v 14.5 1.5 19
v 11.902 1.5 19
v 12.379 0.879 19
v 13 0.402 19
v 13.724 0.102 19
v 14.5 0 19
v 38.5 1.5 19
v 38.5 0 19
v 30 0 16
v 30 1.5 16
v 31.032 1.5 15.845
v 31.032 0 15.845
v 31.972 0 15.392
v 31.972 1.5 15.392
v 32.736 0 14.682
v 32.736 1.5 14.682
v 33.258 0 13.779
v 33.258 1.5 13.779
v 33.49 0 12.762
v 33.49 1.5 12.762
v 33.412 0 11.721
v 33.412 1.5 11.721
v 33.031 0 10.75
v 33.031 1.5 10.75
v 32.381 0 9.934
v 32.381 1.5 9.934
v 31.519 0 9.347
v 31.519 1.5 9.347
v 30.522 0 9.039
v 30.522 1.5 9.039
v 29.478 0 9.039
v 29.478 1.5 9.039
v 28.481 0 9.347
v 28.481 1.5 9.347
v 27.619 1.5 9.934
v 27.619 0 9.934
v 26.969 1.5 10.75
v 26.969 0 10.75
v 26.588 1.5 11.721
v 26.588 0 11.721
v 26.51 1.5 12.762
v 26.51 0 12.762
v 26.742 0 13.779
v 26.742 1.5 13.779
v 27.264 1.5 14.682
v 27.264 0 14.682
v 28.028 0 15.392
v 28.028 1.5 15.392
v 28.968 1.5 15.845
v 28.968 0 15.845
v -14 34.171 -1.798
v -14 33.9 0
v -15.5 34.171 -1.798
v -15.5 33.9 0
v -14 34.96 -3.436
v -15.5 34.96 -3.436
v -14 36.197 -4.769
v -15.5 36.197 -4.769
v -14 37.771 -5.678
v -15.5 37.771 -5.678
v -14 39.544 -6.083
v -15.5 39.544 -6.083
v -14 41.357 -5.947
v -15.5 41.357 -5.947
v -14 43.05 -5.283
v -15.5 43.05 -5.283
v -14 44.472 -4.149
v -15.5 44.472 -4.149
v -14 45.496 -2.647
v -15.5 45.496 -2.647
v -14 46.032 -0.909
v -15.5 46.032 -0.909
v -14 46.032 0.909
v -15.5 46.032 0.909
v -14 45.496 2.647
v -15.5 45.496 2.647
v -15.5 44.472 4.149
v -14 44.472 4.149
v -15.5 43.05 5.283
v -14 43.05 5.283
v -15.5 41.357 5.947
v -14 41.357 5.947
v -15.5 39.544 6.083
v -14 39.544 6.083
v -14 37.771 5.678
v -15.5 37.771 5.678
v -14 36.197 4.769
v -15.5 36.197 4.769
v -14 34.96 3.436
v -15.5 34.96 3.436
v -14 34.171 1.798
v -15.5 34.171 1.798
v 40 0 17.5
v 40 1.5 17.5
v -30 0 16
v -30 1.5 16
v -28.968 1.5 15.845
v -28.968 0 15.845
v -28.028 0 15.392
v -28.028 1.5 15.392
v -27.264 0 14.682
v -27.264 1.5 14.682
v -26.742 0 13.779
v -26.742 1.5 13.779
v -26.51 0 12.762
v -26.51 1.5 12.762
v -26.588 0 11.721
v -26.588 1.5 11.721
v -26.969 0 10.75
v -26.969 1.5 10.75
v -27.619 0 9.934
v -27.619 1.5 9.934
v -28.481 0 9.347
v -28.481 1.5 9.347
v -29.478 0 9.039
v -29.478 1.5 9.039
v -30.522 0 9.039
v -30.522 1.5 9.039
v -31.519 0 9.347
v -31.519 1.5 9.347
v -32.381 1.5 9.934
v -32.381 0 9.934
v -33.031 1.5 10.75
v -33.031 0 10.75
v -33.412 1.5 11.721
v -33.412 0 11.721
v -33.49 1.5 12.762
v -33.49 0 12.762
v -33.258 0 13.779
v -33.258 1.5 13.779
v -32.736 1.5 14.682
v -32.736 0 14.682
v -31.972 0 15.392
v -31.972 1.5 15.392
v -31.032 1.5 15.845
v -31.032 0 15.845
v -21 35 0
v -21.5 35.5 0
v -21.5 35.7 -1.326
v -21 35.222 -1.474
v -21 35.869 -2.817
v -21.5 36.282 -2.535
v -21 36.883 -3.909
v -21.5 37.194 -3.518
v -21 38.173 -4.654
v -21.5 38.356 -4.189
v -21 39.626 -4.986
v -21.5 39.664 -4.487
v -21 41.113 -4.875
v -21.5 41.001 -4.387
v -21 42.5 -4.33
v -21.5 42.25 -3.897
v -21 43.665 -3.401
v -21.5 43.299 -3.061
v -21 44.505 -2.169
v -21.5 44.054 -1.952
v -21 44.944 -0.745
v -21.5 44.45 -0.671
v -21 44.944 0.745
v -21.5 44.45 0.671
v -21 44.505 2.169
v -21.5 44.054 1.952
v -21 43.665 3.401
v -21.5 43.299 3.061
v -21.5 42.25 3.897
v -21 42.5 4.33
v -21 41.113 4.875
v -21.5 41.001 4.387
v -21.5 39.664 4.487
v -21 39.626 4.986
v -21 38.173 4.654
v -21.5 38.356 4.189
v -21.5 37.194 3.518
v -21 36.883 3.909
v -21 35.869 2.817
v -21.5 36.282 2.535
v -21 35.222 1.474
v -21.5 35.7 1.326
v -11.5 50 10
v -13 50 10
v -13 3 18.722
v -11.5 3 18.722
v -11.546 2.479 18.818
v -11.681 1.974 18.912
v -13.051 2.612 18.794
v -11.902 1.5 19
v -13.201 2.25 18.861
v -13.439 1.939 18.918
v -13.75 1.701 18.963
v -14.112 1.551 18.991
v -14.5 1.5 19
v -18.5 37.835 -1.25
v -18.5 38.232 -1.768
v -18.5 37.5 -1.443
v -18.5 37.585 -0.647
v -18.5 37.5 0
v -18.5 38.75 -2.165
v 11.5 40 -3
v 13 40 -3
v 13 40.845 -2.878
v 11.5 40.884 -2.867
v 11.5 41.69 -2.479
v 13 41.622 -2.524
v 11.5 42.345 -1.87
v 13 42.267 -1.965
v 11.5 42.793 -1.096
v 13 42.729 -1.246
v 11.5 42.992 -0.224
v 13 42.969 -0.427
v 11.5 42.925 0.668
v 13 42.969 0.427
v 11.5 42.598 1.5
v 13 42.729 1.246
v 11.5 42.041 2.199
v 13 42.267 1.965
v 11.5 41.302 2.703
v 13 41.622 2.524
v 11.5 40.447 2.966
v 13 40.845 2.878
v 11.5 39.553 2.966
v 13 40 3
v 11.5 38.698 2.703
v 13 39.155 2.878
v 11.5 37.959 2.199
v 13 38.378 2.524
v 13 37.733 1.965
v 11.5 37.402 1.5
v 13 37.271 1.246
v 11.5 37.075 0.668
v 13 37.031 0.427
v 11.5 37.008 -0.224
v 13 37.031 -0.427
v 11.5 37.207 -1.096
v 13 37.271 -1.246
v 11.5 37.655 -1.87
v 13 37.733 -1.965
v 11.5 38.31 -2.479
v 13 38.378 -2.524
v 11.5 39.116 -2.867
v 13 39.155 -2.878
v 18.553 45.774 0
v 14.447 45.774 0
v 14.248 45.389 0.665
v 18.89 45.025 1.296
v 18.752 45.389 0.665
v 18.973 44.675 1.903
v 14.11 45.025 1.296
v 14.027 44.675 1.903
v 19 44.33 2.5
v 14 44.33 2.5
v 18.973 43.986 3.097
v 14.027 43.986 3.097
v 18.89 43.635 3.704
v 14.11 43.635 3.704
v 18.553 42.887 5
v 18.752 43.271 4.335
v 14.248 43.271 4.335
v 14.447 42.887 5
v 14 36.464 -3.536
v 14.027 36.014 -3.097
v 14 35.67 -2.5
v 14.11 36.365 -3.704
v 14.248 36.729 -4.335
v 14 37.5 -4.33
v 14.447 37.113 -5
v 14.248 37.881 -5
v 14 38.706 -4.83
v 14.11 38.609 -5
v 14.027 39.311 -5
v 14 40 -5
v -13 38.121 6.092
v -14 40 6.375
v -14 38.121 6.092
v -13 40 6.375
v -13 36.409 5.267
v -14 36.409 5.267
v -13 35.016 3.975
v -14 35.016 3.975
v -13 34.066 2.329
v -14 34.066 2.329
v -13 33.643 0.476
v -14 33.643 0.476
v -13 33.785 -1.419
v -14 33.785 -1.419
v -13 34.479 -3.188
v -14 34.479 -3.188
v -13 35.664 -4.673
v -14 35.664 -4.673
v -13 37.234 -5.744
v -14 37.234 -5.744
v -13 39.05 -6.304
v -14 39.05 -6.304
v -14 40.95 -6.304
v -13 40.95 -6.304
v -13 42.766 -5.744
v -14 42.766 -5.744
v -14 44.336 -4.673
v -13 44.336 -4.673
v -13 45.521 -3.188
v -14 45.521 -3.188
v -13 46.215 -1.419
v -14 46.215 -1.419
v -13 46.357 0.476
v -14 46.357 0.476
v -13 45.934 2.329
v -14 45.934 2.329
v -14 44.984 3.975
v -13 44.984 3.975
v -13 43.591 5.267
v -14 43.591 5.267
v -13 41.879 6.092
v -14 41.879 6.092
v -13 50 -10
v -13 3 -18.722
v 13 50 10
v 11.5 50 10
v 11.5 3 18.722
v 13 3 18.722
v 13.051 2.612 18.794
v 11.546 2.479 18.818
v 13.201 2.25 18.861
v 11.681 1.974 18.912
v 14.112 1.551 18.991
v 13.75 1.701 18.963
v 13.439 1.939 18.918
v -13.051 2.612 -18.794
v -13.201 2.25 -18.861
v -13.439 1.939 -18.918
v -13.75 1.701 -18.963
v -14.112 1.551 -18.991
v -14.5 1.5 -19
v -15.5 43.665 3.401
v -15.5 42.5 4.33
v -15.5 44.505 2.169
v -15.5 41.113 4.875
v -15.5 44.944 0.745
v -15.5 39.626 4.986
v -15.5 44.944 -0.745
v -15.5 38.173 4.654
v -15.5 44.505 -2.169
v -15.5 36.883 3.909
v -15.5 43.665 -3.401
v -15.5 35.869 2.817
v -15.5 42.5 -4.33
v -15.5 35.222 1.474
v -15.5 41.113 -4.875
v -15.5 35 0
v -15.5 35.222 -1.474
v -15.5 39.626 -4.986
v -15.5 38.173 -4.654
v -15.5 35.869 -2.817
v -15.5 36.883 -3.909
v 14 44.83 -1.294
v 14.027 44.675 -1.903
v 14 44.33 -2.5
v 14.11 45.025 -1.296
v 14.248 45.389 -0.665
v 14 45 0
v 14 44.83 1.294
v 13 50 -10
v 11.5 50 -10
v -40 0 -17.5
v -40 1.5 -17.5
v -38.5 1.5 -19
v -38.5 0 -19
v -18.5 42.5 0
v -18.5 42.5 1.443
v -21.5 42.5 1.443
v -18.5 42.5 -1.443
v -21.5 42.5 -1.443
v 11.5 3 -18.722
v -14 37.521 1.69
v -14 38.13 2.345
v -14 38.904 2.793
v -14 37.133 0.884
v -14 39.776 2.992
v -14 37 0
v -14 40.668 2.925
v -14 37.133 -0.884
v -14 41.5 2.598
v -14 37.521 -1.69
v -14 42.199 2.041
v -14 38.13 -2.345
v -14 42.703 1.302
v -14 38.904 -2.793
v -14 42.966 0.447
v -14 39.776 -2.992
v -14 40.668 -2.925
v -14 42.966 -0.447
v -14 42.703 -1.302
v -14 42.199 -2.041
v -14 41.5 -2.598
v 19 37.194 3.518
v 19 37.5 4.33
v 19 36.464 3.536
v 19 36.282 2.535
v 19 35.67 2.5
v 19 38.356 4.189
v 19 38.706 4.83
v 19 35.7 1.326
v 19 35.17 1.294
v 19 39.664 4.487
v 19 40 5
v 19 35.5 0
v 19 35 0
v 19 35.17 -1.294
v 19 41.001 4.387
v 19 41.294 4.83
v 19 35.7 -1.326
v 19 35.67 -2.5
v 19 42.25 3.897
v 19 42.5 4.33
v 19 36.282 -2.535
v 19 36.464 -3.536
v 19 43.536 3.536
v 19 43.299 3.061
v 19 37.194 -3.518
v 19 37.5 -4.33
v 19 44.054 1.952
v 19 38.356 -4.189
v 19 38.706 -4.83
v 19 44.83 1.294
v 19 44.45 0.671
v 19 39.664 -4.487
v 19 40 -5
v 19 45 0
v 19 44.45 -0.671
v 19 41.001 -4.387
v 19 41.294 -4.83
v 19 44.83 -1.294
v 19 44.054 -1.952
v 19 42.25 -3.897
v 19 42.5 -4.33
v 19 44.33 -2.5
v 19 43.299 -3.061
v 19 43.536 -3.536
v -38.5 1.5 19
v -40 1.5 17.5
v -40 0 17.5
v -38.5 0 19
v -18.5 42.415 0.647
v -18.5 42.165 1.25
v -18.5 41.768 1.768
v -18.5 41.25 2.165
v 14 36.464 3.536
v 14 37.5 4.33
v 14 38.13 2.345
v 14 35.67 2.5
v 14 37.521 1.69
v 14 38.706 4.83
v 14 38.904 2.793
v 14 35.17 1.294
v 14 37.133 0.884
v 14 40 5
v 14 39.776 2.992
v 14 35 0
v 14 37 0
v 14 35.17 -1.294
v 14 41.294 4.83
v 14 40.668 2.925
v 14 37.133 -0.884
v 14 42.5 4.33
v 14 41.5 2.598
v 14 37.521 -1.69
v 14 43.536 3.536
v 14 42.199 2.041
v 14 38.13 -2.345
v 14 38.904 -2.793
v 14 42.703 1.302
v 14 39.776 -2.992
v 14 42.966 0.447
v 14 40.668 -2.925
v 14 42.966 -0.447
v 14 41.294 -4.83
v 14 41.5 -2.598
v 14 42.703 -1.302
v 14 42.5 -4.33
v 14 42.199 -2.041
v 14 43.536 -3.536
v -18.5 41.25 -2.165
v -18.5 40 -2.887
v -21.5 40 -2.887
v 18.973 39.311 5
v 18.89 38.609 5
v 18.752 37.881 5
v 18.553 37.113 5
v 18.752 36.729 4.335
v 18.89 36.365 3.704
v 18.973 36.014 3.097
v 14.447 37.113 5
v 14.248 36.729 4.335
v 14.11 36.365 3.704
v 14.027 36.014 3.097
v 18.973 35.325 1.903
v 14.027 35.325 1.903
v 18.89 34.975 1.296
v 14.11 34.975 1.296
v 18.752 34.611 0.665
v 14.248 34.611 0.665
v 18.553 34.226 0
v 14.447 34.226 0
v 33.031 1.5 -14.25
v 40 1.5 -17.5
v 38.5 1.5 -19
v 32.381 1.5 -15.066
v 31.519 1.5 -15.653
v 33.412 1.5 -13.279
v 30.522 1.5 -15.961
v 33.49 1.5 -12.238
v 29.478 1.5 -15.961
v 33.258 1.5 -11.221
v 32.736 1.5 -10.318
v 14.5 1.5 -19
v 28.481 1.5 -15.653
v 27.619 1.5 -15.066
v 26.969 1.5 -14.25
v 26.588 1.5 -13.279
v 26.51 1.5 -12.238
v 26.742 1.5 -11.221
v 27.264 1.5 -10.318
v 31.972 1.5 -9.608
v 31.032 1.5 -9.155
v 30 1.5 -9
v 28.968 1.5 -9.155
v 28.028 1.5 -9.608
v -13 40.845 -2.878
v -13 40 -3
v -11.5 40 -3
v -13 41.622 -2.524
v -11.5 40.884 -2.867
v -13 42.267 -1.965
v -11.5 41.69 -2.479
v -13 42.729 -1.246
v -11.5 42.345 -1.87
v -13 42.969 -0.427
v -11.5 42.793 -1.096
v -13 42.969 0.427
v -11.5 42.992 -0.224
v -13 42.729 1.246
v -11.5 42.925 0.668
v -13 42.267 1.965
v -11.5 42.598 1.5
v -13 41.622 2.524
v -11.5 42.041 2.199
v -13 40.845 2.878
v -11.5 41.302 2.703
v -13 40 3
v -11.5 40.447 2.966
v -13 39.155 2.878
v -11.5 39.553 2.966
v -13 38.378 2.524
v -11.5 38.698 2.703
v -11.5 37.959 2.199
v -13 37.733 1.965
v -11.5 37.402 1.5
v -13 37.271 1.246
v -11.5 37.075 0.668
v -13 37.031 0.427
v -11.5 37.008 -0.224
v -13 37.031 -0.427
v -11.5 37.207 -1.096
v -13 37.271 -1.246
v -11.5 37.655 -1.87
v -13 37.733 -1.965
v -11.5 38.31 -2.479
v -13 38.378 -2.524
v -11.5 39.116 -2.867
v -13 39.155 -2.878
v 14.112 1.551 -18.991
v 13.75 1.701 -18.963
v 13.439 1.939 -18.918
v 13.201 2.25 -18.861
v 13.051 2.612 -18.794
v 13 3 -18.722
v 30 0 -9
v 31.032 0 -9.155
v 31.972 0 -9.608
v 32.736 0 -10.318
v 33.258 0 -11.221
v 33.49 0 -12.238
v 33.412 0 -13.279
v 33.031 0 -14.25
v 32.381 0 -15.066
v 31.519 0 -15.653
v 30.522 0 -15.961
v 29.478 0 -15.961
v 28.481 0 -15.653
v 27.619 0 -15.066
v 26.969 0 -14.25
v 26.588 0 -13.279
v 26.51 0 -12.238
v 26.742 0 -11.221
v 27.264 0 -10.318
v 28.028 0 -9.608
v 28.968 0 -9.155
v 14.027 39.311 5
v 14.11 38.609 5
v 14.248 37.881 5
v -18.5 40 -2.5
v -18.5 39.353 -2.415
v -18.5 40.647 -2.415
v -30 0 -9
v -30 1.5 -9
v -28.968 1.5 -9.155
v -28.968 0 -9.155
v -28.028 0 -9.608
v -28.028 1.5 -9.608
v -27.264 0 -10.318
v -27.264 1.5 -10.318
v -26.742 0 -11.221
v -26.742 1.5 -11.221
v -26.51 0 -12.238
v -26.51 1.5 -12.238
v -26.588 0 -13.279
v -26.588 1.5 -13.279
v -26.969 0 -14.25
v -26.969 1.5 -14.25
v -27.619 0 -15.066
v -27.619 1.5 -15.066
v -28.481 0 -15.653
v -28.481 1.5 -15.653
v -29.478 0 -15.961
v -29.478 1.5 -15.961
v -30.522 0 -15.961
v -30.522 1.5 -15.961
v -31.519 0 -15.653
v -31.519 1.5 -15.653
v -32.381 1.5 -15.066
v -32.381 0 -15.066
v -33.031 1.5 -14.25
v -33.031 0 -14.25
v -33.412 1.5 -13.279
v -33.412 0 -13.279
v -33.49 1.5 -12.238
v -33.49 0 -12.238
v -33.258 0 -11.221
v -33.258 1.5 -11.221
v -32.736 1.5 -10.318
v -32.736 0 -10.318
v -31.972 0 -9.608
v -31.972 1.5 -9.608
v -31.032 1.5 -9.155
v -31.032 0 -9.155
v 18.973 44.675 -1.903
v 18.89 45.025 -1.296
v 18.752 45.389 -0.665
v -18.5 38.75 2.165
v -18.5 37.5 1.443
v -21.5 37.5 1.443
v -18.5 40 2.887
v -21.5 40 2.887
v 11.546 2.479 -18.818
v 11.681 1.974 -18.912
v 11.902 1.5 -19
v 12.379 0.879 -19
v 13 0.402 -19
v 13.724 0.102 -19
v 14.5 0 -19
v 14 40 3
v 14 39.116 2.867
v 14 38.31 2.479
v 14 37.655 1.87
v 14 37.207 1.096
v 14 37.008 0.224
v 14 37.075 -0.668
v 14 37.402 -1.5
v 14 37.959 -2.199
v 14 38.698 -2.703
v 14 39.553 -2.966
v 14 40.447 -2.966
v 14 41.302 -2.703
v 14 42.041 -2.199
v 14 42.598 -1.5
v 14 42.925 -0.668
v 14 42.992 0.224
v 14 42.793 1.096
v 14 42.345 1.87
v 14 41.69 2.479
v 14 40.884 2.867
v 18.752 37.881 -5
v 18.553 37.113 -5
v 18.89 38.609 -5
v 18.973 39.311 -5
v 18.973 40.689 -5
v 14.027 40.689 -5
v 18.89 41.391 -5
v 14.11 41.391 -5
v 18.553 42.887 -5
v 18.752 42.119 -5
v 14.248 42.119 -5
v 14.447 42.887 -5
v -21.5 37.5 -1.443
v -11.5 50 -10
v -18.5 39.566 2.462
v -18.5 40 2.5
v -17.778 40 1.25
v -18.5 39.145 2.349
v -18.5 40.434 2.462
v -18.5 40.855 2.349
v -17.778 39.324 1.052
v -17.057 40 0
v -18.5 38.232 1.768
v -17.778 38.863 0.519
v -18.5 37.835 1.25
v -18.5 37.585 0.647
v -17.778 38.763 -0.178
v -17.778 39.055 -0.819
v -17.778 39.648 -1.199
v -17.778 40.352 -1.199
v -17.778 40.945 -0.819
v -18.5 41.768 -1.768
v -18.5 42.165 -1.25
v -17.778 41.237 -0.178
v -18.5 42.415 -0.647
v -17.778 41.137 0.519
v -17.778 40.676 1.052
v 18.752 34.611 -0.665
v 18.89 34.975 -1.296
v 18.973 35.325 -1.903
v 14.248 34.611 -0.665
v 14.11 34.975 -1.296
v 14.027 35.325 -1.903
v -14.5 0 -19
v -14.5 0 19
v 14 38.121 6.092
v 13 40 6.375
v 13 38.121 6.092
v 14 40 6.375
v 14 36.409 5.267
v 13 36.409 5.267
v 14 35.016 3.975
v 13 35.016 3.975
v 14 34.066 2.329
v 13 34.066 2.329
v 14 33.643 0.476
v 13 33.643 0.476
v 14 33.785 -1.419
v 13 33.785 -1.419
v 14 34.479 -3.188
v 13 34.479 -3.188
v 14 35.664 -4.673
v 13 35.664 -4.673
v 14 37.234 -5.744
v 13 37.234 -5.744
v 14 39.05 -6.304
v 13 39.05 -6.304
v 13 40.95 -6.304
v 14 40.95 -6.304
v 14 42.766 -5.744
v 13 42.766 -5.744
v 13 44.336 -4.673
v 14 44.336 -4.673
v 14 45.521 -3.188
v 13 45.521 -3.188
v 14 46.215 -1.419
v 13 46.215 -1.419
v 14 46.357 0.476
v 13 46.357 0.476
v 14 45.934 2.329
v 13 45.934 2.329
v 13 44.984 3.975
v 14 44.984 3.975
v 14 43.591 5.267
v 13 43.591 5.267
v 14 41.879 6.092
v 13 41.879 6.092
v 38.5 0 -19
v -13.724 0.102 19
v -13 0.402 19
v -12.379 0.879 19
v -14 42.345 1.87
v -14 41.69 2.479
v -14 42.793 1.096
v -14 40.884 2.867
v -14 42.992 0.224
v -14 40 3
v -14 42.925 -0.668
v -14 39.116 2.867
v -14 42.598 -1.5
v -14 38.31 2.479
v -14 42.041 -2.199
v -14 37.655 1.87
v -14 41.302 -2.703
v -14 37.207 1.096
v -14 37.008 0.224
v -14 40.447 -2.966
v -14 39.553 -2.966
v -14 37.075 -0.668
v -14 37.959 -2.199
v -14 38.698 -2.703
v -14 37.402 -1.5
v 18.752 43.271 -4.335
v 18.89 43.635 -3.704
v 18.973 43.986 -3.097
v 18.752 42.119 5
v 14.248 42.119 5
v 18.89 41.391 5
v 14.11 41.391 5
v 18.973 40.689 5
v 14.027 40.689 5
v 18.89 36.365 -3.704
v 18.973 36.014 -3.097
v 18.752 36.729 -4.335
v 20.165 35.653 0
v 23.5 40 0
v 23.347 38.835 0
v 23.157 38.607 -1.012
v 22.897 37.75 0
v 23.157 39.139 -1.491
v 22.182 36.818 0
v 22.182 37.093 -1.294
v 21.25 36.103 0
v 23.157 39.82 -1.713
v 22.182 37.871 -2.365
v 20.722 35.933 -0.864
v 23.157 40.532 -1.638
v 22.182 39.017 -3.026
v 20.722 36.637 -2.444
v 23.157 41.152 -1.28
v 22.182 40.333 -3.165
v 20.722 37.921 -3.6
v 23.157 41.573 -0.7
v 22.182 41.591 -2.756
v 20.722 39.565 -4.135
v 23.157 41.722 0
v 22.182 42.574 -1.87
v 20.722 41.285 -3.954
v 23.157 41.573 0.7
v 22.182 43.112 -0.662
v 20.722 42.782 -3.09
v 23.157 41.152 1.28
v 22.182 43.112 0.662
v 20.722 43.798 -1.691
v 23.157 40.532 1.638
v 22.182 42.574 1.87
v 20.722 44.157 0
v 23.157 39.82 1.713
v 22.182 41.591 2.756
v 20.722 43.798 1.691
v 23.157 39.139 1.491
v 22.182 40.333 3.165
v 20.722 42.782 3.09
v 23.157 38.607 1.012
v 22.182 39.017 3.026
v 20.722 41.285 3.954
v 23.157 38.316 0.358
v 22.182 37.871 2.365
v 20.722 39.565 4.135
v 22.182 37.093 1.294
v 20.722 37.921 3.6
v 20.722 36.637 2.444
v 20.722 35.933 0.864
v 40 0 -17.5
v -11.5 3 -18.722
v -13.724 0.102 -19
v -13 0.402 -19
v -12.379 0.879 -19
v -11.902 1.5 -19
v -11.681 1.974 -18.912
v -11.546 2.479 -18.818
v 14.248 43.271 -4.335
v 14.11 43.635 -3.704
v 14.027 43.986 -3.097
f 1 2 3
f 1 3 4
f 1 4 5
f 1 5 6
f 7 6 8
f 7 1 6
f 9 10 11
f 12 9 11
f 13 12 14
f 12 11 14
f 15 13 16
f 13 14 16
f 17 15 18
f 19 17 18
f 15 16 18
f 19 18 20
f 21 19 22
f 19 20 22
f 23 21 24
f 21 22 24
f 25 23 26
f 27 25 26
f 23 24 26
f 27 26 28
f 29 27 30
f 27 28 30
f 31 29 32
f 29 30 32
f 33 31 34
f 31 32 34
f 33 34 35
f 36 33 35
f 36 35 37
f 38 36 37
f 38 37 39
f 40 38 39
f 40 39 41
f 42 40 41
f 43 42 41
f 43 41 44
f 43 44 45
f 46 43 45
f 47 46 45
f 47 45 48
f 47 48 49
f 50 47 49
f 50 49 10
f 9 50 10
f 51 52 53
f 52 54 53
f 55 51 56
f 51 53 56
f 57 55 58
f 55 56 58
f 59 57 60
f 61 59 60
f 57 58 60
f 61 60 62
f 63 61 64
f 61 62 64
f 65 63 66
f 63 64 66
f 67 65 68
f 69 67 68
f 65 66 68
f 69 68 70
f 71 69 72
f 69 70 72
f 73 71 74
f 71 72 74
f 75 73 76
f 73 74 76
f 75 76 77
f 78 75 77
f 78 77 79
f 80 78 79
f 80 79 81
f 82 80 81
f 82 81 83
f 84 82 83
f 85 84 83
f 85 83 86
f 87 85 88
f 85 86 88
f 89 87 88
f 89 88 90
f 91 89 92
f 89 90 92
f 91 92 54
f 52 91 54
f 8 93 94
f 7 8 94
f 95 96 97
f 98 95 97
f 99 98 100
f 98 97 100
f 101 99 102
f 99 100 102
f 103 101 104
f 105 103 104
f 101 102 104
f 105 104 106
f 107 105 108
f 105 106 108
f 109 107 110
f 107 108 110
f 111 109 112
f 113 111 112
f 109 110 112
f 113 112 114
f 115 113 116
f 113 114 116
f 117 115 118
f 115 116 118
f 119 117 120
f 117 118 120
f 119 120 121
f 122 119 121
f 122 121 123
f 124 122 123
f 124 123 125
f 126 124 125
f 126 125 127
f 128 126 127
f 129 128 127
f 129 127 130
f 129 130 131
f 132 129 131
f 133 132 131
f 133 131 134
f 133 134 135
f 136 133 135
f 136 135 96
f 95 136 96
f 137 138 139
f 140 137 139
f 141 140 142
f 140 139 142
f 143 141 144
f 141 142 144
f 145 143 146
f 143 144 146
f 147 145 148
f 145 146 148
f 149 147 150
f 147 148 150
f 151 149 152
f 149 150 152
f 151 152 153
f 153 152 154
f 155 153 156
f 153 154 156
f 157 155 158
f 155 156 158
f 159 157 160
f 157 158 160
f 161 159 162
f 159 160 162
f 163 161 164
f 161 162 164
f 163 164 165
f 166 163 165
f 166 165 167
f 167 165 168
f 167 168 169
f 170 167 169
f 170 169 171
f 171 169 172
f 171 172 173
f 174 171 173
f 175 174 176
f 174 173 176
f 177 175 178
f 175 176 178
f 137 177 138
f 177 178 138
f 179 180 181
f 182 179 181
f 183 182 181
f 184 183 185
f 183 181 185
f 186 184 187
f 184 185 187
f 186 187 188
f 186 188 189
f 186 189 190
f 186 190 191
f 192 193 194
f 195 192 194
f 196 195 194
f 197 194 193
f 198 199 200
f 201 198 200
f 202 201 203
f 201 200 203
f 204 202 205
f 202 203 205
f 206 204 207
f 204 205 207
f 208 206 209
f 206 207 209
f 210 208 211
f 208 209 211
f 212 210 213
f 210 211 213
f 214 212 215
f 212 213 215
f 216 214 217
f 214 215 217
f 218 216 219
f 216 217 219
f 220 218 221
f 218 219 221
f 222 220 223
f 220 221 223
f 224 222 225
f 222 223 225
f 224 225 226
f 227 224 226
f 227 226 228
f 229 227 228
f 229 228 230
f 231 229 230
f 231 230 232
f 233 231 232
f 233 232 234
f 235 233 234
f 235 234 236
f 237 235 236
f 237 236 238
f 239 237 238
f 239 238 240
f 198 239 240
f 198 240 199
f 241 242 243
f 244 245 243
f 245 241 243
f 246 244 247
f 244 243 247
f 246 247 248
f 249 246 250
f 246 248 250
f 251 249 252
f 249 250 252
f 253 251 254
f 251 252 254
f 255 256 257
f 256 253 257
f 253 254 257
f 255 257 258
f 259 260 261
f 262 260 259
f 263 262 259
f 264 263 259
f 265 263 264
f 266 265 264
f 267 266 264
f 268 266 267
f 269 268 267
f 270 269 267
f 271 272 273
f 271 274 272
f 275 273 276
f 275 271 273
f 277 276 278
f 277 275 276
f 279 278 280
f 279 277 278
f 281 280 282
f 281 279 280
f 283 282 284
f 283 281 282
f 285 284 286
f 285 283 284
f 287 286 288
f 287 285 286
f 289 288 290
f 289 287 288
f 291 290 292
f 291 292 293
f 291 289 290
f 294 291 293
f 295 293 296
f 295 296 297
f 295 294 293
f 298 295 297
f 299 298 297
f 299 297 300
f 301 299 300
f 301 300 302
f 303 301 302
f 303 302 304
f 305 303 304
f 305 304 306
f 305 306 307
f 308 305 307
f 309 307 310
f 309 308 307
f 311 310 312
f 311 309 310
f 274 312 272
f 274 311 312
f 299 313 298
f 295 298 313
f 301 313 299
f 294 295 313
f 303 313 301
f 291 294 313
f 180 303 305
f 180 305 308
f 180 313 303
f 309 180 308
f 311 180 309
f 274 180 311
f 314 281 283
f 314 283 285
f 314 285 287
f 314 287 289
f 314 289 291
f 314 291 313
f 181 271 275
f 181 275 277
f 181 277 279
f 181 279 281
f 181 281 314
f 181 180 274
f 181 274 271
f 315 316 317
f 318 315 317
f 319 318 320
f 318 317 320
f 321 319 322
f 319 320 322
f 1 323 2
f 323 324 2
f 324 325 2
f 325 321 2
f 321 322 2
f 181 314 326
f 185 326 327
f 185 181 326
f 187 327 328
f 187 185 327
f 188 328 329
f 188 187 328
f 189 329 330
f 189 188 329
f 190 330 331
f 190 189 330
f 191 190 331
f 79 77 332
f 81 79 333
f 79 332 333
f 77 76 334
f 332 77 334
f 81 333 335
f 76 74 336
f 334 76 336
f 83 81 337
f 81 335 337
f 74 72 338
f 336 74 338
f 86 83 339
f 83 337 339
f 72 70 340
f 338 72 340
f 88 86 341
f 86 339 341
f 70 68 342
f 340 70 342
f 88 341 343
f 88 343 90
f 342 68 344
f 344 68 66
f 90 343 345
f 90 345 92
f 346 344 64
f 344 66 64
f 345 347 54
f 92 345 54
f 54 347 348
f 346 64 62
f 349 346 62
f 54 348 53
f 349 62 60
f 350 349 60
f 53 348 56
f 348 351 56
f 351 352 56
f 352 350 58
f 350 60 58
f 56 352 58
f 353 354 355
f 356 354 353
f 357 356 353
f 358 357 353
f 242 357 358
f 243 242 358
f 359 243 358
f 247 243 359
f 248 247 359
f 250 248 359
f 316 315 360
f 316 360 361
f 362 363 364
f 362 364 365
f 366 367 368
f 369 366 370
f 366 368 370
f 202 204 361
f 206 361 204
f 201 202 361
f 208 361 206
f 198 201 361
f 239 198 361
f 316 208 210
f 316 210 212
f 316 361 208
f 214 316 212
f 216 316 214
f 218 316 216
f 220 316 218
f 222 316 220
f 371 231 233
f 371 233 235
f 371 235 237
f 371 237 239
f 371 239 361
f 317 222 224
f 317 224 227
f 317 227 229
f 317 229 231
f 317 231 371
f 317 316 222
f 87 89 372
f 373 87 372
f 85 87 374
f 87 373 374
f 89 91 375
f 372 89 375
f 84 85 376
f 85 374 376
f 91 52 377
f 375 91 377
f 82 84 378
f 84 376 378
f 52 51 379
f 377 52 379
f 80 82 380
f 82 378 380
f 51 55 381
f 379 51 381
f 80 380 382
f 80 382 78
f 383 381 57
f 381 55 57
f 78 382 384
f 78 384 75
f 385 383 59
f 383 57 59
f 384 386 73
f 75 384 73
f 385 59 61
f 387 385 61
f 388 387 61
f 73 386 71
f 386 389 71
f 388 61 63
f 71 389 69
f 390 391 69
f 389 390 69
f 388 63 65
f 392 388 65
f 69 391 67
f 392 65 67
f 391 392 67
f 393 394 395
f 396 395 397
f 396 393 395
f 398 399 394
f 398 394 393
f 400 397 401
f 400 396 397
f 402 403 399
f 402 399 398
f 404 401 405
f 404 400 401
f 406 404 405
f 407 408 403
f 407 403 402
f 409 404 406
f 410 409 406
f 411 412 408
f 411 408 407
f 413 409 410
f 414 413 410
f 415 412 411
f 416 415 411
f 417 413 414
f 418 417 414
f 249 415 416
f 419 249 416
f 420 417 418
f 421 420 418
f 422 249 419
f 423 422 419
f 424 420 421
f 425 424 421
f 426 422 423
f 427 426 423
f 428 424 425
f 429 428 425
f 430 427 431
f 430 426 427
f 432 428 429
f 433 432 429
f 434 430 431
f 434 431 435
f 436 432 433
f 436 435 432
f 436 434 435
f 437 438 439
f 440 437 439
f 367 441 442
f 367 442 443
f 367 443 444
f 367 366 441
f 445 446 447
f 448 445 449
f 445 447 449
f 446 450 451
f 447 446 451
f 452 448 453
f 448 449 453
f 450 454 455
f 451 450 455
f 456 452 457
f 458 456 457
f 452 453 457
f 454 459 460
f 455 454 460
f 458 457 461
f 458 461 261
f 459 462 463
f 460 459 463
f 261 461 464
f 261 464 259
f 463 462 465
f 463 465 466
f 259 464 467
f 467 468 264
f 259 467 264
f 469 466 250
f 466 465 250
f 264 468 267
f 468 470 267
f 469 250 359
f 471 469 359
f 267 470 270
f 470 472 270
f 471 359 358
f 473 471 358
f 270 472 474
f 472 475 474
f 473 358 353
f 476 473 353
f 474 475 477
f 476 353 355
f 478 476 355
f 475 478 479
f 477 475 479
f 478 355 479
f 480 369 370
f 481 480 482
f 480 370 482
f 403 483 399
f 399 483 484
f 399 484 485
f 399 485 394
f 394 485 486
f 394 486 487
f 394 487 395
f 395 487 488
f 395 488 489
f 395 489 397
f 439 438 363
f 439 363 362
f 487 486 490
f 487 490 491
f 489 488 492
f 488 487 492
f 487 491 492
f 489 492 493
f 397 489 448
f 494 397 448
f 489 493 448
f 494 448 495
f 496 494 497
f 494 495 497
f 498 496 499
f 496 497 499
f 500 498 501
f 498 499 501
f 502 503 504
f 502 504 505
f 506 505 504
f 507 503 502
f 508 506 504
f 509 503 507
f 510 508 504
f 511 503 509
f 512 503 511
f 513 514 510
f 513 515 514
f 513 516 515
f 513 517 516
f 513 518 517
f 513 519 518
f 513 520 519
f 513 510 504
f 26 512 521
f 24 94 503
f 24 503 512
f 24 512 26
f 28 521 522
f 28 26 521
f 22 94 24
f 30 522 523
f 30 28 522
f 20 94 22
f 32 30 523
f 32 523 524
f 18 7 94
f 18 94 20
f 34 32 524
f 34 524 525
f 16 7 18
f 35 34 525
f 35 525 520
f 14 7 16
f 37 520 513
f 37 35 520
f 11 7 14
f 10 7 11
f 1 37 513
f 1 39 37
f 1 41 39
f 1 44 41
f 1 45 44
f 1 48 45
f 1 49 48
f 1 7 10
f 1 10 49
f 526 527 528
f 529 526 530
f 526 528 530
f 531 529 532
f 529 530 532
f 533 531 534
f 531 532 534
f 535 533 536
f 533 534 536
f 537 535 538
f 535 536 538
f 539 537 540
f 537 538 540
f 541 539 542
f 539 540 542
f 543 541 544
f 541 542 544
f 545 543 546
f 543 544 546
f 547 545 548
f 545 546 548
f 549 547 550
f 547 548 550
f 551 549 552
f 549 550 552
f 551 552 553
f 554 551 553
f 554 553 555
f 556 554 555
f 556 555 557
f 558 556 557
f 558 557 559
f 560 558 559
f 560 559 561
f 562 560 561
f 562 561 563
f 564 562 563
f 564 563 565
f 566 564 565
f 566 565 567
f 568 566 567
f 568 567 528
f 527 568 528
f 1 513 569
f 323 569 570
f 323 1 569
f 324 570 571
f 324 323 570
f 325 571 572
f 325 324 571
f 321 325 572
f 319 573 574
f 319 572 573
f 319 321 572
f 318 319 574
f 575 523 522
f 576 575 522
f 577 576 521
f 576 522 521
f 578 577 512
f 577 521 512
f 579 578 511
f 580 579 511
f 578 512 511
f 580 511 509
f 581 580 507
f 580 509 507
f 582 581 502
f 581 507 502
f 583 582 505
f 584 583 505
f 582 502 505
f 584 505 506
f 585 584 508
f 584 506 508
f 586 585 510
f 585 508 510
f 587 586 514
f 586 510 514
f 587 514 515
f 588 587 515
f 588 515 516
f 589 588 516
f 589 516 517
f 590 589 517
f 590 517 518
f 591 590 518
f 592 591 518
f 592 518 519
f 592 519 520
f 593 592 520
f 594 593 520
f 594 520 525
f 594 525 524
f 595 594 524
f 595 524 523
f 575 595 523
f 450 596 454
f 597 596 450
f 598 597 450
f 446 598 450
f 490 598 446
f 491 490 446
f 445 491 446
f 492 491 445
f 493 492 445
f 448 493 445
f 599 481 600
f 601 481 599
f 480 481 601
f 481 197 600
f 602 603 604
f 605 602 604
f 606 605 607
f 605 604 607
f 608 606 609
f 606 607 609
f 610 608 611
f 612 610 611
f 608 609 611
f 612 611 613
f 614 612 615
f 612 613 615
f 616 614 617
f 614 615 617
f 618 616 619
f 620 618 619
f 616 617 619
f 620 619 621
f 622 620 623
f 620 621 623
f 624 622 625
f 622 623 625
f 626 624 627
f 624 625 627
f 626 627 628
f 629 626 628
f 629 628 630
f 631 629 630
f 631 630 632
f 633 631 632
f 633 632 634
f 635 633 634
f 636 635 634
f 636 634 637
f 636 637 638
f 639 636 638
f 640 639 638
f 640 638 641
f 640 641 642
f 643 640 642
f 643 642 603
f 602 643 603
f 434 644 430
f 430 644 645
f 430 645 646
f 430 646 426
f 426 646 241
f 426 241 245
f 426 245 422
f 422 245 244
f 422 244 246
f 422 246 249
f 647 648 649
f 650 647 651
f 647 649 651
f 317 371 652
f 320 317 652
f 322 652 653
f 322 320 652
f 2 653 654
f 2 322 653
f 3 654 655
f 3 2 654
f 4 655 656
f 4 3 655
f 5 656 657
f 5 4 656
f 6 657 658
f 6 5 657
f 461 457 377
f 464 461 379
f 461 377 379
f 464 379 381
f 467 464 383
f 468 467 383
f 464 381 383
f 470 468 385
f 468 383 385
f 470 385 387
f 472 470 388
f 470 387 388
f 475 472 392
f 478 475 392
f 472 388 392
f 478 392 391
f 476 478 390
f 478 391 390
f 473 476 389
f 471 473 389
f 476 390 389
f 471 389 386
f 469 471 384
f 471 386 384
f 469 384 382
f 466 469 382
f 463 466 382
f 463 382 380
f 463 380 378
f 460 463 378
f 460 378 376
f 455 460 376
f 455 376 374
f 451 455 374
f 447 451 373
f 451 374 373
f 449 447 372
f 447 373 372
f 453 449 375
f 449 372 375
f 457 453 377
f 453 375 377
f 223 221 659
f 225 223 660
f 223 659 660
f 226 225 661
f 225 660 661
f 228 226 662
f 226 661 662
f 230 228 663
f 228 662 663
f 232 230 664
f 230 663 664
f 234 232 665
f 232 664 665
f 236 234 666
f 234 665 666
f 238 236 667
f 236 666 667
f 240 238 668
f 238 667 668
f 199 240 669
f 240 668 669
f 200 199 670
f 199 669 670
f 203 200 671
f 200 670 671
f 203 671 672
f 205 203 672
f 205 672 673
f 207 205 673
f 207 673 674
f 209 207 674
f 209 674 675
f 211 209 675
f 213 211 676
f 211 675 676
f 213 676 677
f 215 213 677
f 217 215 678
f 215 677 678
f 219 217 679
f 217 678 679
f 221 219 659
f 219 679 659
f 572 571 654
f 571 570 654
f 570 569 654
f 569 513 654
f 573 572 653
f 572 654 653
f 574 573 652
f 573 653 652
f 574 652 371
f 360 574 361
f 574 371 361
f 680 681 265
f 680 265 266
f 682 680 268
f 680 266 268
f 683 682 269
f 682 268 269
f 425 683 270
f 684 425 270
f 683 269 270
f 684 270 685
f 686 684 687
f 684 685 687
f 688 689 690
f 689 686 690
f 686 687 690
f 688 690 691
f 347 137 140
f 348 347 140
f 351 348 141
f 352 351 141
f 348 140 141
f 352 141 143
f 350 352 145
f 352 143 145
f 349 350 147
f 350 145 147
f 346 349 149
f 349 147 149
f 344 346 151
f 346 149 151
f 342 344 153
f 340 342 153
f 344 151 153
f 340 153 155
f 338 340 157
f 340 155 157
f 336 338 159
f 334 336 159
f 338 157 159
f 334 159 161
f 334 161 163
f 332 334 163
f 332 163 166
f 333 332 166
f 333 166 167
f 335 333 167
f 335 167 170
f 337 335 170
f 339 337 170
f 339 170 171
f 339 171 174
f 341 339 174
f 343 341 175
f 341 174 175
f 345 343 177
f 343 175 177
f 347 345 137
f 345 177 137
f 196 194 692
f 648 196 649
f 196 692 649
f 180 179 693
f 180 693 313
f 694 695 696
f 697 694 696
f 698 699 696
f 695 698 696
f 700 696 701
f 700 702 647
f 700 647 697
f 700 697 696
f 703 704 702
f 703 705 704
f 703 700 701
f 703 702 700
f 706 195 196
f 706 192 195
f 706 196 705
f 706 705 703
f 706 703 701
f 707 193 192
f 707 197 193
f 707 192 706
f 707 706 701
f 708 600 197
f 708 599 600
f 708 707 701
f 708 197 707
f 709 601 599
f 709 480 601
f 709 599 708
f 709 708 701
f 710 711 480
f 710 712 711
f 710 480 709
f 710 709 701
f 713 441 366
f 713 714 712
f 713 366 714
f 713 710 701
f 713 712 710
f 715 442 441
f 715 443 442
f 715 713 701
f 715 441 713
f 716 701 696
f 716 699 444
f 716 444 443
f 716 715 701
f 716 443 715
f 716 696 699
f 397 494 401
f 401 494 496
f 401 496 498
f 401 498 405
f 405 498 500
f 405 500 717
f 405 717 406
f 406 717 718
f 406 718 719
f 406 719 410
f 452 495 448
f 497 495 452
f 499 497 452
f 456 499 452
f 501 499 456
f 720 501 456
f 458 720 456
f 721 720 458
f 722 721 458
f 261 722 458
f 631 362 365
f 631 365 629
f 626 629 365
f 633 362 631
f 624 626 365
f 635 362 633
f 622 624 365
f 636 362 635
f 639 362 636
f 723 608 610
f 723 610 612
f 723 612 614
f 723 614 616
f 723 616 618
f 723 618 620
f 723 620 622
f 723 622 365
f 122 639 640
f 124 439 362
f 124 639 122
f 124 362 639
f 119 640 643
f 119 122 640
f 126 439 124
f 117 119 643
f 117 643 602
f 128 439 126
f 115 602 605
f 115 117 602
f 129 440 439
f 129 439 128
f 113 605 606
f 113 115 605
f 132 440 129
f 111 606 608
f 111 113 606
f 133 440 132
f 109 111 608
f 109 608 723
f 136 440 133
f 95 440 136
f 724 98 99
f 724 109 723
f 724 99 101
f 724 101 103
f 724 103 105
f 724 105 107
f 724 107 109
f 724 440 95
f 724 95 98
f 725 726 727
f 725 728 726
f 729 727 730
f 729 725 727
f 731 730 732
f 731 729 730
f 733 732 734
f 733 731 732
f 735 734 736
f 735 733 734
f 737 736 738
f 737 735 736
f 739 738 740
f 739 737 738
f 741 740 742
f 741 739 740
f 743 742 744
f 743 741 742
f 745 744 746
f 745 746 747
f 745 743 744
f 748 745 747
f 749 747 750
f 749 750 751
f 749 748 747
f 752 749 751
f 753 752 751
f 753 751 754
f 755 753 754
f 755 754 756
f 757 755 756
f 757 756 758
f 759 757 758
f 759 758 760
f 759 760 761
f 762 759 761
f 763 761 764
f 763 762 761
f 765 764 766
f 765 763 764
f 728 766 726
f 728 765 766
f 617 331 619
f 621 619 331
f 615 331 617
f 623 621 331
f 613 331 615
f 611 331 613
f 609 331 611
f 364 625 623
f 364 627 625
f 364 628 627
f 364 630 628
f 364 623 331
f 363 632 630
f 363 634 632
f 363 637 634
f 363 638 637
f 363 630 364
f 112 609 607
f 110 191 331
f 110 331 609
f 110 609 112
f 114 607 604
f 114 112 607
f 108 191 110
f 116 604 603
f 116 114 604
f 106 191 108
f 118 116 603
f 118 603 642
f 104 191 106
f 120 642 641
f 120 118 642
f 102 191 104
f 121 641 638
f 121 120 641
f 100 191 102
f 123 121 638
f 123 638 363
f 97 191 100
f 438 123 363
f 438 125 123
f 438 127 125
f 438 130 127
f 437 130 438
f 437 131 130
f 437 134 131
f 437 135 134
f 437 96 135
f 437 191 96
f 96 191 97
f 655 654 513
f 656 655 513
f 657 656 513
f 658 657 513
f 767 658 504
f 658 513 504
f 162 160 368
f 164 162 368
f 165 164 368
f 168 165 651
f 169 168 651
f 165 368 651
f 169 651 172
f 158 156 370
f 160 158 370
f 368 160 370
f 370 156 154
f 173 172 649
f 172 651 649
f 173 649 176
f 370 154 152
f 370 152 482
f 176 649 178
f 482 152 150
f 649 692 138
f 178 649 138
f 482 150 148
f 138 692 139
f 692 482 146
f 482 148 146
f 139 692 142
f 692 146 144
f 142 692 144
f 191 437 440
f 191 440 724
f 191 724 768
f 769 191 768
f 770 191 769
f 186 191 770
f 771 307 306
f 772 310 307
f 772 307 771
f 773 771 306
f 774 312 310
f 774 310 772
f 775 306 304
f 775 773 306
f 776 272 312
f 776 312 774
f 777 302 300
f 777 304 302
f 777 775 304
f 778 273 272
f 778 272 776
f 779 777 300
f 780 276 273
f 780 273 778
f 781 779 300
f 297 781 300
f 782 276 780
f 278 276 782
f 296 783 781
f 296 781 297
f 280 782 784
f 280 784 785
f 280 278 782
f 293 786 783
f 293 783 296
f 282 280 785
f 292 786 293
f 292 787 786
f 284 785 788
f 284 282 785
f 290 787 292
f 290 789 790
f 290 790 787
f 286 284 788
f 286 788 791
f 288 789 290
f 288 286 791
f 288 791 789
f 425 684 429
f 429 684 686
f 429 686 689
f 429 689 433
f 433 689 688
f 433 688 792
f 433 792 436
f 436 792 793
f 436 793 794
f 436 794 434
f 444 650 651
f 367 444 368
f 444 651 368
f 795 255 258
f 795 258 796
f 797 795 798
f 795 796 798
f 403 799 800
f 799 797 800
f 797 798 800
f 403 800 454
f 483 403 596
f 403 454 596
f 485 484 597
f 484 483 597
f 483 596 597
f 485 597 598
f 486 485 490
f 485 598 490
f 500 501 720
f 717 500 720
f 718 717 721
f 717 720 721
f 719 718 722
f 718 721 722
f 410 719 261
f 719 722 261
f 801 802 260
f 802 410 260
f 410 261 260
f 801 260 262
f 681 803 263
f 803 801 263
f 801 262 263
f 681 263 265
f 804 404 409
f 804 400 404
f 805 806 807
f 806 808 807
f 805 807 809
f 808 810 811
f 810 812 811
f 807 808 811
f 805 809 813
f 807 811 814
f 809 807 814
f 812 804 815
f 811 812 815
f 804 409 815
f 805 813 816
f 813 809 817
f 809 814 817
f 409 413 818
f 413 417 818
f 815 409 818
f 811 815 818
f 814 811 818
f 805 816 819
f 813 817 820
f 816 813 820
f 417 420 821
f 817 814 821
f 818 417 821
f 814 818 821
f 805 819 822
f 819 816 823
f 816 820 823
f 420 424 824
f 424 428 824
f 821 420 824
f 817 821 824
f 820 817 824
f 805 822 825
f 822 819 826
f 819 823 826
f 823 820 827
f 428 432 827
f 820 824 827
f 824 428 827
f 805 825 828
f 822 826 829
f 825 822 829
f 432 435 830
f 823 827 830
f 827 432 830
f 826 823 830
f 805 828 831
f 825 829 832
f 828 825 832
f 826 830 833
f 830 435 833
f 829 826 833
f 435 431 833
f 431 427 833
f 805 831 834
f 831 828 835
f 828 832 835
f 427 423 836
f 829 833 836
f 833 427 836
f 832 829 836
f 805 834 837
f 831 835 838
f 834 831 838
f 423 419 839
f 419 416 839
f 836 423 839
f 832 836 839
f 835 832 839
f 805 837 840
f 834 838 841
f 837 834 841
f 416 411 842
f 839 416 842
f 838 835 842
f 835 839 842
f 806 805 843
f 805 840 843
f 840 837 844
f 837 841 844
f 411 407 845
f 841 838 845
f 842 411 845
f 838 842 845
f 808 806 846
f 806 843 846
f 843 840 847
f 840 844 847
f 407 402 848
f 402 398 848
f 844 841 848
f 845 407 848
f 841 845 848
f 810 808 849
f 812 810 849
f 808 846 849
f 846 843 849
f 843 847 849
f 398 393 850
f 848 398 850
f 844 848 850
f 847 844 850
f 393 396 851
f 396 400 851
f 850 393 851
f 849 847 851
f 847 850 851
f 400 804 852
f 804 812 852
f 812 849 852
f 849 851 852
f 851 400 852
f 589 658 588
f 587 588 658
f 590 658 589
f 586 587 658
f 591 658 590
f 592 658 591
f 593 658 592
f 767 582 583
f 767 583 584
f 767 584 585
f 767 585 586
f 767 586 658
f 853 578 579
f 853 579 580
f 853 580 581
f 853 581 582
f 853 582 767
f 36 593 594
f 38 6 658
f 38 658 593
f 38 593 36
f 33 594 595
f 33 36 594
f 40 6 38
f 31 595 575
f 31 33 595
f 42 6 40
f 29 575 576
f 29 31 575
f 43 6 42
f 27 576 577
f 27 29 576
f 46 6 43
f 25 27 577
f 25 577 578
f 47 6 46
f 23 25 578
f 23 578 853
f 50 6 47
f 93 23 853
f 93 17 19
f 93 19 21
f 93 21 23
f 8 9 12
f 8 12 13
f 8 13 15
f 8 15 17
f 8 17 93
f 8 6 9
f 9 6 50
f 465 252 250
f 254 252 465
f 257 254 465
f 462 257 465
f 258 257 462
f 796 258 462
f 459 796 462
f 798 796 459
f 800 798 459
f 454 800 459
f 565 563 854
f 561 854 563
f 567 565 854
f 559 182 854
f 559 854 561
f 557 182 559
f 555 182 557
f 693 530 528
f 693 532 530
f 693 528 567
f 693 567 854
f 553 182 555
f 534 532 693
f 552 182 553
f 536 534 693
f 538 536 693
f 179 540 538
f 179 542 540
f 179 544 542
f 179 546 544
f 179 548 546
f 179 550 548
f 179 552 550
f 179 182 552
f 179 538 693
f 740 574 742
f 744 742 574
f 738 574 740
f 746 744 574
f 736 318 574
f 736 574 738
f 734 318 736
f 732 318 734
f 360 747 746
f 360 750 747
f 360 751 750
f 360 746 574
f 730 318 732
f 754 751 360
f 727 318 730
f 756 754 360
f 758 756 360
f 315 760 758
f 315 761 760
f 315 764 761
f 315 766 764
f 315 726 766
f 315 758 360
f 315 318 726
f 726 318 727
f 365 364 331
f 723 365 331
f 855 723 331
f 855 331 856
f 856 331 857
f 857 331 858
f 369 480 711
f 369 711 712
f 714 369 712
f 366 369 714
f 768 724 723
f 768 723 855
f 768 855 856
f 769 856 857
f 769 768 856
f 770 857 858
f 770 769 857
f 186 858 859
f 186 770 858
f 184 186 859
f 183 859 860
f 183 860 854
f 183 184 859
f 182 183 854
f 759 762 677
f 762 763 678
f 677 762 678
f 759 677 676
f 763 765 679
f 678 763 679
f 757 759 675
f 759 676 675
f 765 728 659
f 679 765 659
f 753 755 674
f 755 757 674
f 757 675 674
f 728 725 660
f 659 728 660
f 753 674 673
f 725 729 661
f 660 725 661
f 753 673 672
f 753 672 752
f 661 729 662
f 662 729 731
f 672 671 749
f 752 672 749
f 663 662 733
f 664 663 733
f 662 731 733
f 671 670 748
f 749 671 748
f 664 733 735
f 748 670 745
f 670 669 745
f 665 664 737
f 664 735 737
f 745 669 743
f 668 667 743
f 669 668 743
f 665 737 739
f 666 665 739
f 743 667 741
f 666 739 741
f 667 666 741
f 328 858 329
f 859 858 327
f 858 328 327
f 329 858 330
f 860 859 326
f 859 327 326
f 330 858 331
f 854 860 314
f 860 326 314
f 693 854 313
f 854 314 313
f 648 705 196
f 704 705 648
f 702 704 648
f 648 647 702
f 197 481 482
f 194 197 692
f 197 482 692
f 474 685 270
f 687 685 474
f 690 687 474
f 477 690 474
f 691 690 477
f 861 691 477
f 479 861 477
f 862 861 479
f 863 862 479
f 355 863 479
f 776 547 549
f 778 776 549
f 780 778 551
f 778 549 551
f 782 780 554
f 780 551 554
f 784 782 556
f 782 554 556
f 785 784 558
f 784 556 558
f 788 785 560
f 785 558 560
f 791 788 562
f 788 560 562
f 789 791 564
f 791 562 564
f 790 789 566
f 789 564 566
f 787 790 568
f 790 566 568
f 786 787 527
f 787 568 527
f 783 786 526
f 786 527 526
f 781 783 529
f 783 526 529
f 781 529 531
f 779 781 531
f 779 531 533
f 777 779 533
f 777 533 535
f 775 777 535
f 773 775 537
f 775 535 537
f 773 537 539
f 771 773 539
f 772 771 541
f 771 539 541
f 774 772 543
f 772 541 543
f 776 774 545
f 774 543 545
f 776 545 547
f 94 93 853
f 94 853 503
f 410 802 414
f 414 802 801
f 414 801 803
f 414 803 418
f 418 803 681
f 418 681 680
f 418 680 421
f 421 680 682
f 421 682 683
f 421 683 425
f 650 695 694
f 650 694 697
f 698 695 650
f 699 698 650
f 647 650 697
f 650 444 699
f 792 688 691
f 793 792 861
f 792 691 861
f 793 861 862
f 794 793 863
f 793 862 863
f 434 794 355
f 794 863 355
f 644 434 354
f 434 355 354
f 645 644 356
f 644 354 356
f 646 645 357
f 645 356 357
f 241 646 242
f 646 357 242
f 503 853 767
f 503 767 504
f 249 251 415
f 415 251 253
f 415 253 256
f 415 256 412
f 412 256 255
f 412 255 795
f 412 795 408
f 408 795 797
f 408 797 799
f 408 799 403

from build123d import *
from build123d.topology import SkipClean

# Parameters (mm, degrees)
BOSS_EXTRUDE1_DEPTH     = 19
BOSS_EXTRUDE1_2_DEPTH   = 19
CUT_EXTRUDE1_DEPTH      = 67.790717918
CUT_EXTRUDE1_DEPTH_BACK = 67.790717918
SKETCH3_R               = 3
CUT_EXTRUDE2_DEPTH      = 76.299402388
SKETCH4_R               = 3.5
CUT_EXTRUDE3_DEPTH      = 66.675337837
CHAMFER1_SIZE           = 1.5
CHAMFER2_SIZE           = 1.5
SKETCH5_W               = 1
SKETCH5_H               = 3.375
BOSS_EXTRUDE2_DEPTH     = 5
CUT_EXTRUDE4_DEPTH      = 3
CHAMFER3_SIZE           = 0.5


with BuildPart() as part:
    # Sketch1 → Boss-Extrude1 (new, symmetric)
    with BuildSketch(Plane.XY):
        with BuildLine():
            Line((-40, 0), (-14.5, 0))
            ThreePointArc((-14.5, 0), (-12.378679656, 0.878679656), (-11.5, 3))
            Line((-11.5, 3), (-11.5, 50))
            Line((-11.5, 50), (-13, 50))
            Line((-13, 50), (-13, 3))
            ThreePointArc((-13, 3), (-13.439339828, 1.939339828), (-14.5, 1.5))
            Line((-14.5, 1.5), (-40, 1.5))
            Line((-40, 1.5), (-40, 0))
        make_face()
    extrude(amount=BOSS_EXTRUDE1_DEPTH, both=True)


with BuildPart() as body_2:
    # Sketch1 → Boss-Extrude1 2 (new, symmetric)
    with BuildSketch(Plane.XY):
        with BuildLine():
            Line((13, 50), (11.5, 50))
            Line((11.5, 50), (11.5, 3))
            ThreePointArc((11.5, 3), (12.378679656, 0.878679656), (14.5, 0))
            Line((14.5, 0), (40, 0))
            Line((40, 0), (40, 1.5))
            Line((40, 1.5), (14.5, 1.5))
            ThreePointArc((14.5, 1.5), (13.439339828, 1.939339828), (13, 3))
            Line((13, 3), (13, 50))
        make_face()
    extrude(amount=BOSS_EXTRUDE1_2_DEPTH, both=True)


with BuildPart() as cut_extrude1_tool:
    # Sketch2 → Cut-Extrude1 (new, two sides: drawn at the far end of the back side and taken through both)
    with BuildSketch(Plane(origin=(0, 0, 0), x_dir=(0, 0, -1), z_dir=(1, 0, 0)).offset(-CUT_EXTRUDE1_DEPTH_BACK)):
        Polygon((-19, 50), (-10, 50), (-19, 1.5), align=None)
        Polygon((10, 50), (19, 50), (19, 1.5), align=None)
    extrude(amount=CUT_EXTRUDE1_DEPTH + CUT_EXTRUDE1_DEPTH_BACK)


with BuildPart() as part_1:
    add(part.part)

    # Cut-Extrude1: cut by cut_extrude1_tool
    add(cut_extrude1_tool.part, mode=Mode.SUBTRACT)


with BuildPart() as body_2_1:
    add(body_2.part)

    # Cut-Extrude1: cut by cut_extrude1_tool
    add(cut_extrude1_tool.part, mode=Mode.SUBTRACT)


with BuildPart() as cut_extrude2_tool:
    # Sketch3 → Cut-Extrude2 (new, through all)
    with BuildSketch(Plane(origin=(13, 0, 0), x_dir=(0, 0, -1), z_dir=(1, 0, 0))):
        with Locations((0, 40)):
            Circle(SKETCH3_R)
    extrude(amount=-CUT_EXTRUDE2_DEPTH)


with BuildPart() as part_2:
    add(part_1.part)

    # Cut-Extrude2: cut by cut_extrude2_tool
    add(cut_extrude2_tool.part, mode=Mode.SUBTRACT)


with BuildPart() as body_2_2:
    add(body_2_1.part)

    # Cut-Extrude2: cut by cut_extrude2_tool
    add(cut_extrude2_tool.part, mode=Mode.SUBTRACT)


with BuildPart() as cut_extrude3_tool:
    # Sketch4 → Cut-Extrude3 (new, through all)
    with BuildSketch(Plane(origin=(0, 1.5, 0), x_dir=(1, 0, 0), z_dir=(0, 1, 0))):
        with Locations(Location((-30, 12.5, 0), (0, 0, 270))):
            Circle(SKETCH4_R)
        with Locations(Location((-30, -12.5, 0), (0, 0, 270))):
            Circle(SKETCH4_R)
        with Locations(Location((30, 12.5, 0), (0, 0, 270))):
            Circle(SKETCH4_R)
        with Locations(Location((30, -12.5, 0), (0, 0, 270))):
            Circle(SKETCH4_R)
    extrude(amount=-CUT_EXTRUDE3_DEPTH)


with BuildPart() as part_3:
    add(part_2.part)

    # Cut-Extrude3: cut by cut_extrude3_tool
    add(cut_extrude3_tool.part, mode=Mode.SUBTRACT)

    # Chamfer1
    chamfer1_edges = [part_3.edges().sort_by_distance(p)[0] for p in [
        (-40, 0.75, -19),
        (-40, 0.75, 19),
    ]]
    chamfer(chamfer1_edges, length=CHAMFER1_SIZE)



with BuildPart() as body_2_3:
    add(body_2_2.part)

    # Cut-Extrude3: cut by cut_extrude3_tool
    add(cut_extrude3_tool.part, mode=Mode.SUBTRACT)

    # Chamfer2
    chamfer2_edges = [body_2_3.edges().sort_by_distance(p)[0] for p in [
        (40, 0.75, 19),
        (40, 0.75, -19),
    ]]
    chamfer(chamfer2_edges, length=CHAMFER2_SIZE)


with BuildPart() as part_4:
    with SkipClean():  # the faces are left unmerged after this step: merging them gives an invalid solid
        add(part_3.part)

        add(body_2_3.part)  # Revolve1 merges body 2
        # Sketch5 → Revolve1 (revolve)
        with BuildSketch(Plane.XY, mode=Mode.PRIVATE) as revolve1_sk:
            with Locations((-13.5, 44.6875)):
                Rectangle(SKETCH5_W, SKETCH5_H)
            with Locations((13.5, 44.6875)):
                Rectangle(SKETCH5_W, SKETCH5_H)
        revolve(revolve1_sk.sketch.rotate(Axis((-14, 40, 0), (1, 0, 0)), 90), axis=Axis((-14, 40, 0), (1, 0, 0)))


with BuildPart() as body_2_2_1:
    # Sketch6 → Revolve2 (revolve)
    with BuildSketch(Plane.XY, mode=Mode.PRIVATE) as revolve2_sk:
        with BuildLine():
            Line((-21.5, 40), (23.5, 40))
            ThreePointArc((23.5, 40), (22.181980515, 43.181980515), (19, 44.5))
            Line((19, 44.5), (19, 45))
            Line((19, 45), (14, 45))
            Line((14, 45), (14, 43))
            Line((14, 43), (-14, 43))
            Line((-14, 43), (-14, 46.1))
            Line((-14, 46.1), (-15.5, 46.1))
            Line((-15.5, 46.1), (-15.5, 45))
            Line((-15.5, 45), (-21.5, 45))
            Line((-21.5, 45), (-21.5, 40))
        make_face()
    revolve(revolve2_sk.sketch.rotate(Axis((-21.5, 40, 0), (1, 0, 0)), 180), axis=Axis((-21.5, 40, 0), (1, 0, 0)))

    # Sketch7 → Boss-Extrude2 (add)
    with BuildSketch(Plane(origin=(14, 0, 0), x_dir=(0, 0, -1), z_dir=(1, 0, 0))):
        Polygon((0, 34.226497308), (5, 37.113248654), (5, 42.886751346), (0, 45.773502692), (-5, 42.886751346), (-5, 37.113248654), align=None)
    extrude(amount=BOSS_EXTRUDE2_DEPTH)

    # Sketch8 → Cut-Revolve1 (revolve, cut)
    with BuildSketch(Plane.XY, mode=Mode.PRIVATE) as cut_revolve1_sk:
        Polygon((18.553418013, 45.773502692), (19, 45.773502692), (19, 45), align=None)
        Polygon((14.446581987, 45.773502692), (14, 45.773502692), (14, 45), align=None)
        Polygon((-21.5, 40), (-17.056624327, 40), (-18.5, 42.5), (-21.5, 42.5), align=None)
    revolve(cut_revolve1_sk.sketch.rotate(Axis((-21.5, 40, 0), (1, 0, 0)), 90), axis=Axis((-21.5, 40, 0), (1, 0, 0)), mode=Mode.SUBTRACT)

    # Sketch9 → Cut-Extrude4 (cut)
    with BuildSketch(Plane.ZY.offset(21.5)):
        Polygon((2.886751346, 40), (1.443375673, 42.5), (-1.443375673, 42.5), (-2.886751346, 40), (-1.443375673, 37.5), (1.443375673, 37.5), align=None)
    extrude(amount=-CUT_EXTRUDE4_DEPTH, mode=Mode.SUBTRACT)

    # Chamfer3
    chamfer3_edges = [body_2_2_1.edges().sort_by_distance(p)[0] for p in [
        (-21.5, 45, 0),
    ]]
    chamfer(chamfer3_edges, length=CHAMFER3_SIZE)


solid = Compound([part_4.part, body_2_2_1.part])
